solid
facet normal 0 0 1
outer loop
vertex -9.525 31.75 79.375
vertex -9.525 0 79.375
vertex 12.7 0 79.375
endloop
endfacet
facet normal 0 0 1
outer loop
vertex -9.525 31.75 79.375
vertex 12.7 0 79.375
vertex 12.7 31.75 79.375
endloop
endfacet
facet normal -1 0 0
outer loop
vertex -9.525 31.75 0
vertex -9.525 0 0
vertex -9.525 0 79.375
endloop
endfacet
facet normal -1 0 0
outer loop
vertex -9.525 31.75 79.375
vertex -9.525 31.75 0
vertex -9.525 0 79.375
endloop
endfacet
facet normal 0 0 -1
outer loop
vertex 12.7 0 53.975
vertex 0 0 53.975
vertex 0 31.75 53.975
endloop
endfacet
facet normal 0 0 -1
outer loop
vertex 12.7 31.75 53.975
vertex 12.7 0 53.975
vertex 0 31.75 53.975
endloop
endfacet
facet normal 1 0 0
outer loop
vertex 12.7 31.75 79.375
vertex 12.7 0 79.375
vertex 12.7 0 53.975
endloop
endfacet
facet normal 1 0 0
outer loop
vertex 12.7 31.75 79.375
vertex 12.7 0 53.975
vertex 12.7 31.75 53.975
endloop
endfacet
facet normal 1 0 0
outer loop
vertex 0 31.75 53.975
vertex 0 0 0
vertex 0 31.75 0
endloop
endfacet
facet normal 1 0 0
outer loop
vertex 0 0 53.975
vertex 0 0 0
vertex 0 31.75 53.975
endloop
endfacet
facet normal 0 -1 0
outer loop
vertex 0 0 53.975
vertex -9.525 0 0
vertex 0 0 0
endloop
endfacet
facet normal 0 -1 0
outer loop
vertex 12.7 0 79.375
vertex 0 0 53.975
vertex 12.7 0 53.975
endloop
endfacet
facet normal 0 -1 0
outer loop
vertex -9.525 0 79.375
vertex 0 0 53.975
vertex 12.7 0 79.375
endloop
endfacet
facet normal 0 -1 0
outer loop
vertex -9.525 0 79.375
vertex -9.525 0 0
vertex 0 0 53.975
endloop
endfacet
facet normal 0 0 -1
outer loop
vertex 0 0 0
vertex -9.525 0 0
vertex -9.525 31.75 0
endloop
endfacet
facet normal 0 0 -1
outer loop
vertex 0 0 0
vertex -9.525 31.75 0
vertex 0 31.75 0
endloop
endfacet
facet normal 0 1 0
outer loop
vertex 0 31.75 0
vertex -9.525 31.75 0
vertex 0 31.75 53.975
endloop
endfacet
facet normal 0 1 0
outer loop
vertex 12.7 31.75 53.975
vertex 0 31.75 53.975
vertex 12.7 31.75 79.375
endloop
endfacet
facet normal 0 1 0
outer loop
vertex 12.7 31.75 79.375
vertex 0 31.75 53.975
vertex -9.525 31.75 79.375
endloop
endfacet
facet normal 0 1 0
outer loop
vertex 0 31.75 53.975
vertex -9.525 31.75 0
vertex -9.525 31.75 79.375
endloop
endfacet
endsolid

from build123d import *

# Parameters (mm, degrees)
F0_W     = 9.525
F0_H     = 79.375
F1_DEPTH = 31.75
F2_W     = 31.75
F2_H     = 25.4
F3_DEPTH = 12.7


with BuildPart() as f1:
    # F0 (on Front) → F1 (new body)
    with BuildSketch(Plane.XZ):
        with Locations((-4.7625, 39.6875)):
            Rectangle(F0_W, F0_H)
    extrude(amount=-F1_DEPTH)

    # F2 (on face) → F3 (join)
    with BuildSketch(Plane.YZ):
        with Locations((15.875, 66.675)):
            Rectangle(F2_W, F2_H)
    extrude(amount=F3_DEPTH)


solid = f1.part
